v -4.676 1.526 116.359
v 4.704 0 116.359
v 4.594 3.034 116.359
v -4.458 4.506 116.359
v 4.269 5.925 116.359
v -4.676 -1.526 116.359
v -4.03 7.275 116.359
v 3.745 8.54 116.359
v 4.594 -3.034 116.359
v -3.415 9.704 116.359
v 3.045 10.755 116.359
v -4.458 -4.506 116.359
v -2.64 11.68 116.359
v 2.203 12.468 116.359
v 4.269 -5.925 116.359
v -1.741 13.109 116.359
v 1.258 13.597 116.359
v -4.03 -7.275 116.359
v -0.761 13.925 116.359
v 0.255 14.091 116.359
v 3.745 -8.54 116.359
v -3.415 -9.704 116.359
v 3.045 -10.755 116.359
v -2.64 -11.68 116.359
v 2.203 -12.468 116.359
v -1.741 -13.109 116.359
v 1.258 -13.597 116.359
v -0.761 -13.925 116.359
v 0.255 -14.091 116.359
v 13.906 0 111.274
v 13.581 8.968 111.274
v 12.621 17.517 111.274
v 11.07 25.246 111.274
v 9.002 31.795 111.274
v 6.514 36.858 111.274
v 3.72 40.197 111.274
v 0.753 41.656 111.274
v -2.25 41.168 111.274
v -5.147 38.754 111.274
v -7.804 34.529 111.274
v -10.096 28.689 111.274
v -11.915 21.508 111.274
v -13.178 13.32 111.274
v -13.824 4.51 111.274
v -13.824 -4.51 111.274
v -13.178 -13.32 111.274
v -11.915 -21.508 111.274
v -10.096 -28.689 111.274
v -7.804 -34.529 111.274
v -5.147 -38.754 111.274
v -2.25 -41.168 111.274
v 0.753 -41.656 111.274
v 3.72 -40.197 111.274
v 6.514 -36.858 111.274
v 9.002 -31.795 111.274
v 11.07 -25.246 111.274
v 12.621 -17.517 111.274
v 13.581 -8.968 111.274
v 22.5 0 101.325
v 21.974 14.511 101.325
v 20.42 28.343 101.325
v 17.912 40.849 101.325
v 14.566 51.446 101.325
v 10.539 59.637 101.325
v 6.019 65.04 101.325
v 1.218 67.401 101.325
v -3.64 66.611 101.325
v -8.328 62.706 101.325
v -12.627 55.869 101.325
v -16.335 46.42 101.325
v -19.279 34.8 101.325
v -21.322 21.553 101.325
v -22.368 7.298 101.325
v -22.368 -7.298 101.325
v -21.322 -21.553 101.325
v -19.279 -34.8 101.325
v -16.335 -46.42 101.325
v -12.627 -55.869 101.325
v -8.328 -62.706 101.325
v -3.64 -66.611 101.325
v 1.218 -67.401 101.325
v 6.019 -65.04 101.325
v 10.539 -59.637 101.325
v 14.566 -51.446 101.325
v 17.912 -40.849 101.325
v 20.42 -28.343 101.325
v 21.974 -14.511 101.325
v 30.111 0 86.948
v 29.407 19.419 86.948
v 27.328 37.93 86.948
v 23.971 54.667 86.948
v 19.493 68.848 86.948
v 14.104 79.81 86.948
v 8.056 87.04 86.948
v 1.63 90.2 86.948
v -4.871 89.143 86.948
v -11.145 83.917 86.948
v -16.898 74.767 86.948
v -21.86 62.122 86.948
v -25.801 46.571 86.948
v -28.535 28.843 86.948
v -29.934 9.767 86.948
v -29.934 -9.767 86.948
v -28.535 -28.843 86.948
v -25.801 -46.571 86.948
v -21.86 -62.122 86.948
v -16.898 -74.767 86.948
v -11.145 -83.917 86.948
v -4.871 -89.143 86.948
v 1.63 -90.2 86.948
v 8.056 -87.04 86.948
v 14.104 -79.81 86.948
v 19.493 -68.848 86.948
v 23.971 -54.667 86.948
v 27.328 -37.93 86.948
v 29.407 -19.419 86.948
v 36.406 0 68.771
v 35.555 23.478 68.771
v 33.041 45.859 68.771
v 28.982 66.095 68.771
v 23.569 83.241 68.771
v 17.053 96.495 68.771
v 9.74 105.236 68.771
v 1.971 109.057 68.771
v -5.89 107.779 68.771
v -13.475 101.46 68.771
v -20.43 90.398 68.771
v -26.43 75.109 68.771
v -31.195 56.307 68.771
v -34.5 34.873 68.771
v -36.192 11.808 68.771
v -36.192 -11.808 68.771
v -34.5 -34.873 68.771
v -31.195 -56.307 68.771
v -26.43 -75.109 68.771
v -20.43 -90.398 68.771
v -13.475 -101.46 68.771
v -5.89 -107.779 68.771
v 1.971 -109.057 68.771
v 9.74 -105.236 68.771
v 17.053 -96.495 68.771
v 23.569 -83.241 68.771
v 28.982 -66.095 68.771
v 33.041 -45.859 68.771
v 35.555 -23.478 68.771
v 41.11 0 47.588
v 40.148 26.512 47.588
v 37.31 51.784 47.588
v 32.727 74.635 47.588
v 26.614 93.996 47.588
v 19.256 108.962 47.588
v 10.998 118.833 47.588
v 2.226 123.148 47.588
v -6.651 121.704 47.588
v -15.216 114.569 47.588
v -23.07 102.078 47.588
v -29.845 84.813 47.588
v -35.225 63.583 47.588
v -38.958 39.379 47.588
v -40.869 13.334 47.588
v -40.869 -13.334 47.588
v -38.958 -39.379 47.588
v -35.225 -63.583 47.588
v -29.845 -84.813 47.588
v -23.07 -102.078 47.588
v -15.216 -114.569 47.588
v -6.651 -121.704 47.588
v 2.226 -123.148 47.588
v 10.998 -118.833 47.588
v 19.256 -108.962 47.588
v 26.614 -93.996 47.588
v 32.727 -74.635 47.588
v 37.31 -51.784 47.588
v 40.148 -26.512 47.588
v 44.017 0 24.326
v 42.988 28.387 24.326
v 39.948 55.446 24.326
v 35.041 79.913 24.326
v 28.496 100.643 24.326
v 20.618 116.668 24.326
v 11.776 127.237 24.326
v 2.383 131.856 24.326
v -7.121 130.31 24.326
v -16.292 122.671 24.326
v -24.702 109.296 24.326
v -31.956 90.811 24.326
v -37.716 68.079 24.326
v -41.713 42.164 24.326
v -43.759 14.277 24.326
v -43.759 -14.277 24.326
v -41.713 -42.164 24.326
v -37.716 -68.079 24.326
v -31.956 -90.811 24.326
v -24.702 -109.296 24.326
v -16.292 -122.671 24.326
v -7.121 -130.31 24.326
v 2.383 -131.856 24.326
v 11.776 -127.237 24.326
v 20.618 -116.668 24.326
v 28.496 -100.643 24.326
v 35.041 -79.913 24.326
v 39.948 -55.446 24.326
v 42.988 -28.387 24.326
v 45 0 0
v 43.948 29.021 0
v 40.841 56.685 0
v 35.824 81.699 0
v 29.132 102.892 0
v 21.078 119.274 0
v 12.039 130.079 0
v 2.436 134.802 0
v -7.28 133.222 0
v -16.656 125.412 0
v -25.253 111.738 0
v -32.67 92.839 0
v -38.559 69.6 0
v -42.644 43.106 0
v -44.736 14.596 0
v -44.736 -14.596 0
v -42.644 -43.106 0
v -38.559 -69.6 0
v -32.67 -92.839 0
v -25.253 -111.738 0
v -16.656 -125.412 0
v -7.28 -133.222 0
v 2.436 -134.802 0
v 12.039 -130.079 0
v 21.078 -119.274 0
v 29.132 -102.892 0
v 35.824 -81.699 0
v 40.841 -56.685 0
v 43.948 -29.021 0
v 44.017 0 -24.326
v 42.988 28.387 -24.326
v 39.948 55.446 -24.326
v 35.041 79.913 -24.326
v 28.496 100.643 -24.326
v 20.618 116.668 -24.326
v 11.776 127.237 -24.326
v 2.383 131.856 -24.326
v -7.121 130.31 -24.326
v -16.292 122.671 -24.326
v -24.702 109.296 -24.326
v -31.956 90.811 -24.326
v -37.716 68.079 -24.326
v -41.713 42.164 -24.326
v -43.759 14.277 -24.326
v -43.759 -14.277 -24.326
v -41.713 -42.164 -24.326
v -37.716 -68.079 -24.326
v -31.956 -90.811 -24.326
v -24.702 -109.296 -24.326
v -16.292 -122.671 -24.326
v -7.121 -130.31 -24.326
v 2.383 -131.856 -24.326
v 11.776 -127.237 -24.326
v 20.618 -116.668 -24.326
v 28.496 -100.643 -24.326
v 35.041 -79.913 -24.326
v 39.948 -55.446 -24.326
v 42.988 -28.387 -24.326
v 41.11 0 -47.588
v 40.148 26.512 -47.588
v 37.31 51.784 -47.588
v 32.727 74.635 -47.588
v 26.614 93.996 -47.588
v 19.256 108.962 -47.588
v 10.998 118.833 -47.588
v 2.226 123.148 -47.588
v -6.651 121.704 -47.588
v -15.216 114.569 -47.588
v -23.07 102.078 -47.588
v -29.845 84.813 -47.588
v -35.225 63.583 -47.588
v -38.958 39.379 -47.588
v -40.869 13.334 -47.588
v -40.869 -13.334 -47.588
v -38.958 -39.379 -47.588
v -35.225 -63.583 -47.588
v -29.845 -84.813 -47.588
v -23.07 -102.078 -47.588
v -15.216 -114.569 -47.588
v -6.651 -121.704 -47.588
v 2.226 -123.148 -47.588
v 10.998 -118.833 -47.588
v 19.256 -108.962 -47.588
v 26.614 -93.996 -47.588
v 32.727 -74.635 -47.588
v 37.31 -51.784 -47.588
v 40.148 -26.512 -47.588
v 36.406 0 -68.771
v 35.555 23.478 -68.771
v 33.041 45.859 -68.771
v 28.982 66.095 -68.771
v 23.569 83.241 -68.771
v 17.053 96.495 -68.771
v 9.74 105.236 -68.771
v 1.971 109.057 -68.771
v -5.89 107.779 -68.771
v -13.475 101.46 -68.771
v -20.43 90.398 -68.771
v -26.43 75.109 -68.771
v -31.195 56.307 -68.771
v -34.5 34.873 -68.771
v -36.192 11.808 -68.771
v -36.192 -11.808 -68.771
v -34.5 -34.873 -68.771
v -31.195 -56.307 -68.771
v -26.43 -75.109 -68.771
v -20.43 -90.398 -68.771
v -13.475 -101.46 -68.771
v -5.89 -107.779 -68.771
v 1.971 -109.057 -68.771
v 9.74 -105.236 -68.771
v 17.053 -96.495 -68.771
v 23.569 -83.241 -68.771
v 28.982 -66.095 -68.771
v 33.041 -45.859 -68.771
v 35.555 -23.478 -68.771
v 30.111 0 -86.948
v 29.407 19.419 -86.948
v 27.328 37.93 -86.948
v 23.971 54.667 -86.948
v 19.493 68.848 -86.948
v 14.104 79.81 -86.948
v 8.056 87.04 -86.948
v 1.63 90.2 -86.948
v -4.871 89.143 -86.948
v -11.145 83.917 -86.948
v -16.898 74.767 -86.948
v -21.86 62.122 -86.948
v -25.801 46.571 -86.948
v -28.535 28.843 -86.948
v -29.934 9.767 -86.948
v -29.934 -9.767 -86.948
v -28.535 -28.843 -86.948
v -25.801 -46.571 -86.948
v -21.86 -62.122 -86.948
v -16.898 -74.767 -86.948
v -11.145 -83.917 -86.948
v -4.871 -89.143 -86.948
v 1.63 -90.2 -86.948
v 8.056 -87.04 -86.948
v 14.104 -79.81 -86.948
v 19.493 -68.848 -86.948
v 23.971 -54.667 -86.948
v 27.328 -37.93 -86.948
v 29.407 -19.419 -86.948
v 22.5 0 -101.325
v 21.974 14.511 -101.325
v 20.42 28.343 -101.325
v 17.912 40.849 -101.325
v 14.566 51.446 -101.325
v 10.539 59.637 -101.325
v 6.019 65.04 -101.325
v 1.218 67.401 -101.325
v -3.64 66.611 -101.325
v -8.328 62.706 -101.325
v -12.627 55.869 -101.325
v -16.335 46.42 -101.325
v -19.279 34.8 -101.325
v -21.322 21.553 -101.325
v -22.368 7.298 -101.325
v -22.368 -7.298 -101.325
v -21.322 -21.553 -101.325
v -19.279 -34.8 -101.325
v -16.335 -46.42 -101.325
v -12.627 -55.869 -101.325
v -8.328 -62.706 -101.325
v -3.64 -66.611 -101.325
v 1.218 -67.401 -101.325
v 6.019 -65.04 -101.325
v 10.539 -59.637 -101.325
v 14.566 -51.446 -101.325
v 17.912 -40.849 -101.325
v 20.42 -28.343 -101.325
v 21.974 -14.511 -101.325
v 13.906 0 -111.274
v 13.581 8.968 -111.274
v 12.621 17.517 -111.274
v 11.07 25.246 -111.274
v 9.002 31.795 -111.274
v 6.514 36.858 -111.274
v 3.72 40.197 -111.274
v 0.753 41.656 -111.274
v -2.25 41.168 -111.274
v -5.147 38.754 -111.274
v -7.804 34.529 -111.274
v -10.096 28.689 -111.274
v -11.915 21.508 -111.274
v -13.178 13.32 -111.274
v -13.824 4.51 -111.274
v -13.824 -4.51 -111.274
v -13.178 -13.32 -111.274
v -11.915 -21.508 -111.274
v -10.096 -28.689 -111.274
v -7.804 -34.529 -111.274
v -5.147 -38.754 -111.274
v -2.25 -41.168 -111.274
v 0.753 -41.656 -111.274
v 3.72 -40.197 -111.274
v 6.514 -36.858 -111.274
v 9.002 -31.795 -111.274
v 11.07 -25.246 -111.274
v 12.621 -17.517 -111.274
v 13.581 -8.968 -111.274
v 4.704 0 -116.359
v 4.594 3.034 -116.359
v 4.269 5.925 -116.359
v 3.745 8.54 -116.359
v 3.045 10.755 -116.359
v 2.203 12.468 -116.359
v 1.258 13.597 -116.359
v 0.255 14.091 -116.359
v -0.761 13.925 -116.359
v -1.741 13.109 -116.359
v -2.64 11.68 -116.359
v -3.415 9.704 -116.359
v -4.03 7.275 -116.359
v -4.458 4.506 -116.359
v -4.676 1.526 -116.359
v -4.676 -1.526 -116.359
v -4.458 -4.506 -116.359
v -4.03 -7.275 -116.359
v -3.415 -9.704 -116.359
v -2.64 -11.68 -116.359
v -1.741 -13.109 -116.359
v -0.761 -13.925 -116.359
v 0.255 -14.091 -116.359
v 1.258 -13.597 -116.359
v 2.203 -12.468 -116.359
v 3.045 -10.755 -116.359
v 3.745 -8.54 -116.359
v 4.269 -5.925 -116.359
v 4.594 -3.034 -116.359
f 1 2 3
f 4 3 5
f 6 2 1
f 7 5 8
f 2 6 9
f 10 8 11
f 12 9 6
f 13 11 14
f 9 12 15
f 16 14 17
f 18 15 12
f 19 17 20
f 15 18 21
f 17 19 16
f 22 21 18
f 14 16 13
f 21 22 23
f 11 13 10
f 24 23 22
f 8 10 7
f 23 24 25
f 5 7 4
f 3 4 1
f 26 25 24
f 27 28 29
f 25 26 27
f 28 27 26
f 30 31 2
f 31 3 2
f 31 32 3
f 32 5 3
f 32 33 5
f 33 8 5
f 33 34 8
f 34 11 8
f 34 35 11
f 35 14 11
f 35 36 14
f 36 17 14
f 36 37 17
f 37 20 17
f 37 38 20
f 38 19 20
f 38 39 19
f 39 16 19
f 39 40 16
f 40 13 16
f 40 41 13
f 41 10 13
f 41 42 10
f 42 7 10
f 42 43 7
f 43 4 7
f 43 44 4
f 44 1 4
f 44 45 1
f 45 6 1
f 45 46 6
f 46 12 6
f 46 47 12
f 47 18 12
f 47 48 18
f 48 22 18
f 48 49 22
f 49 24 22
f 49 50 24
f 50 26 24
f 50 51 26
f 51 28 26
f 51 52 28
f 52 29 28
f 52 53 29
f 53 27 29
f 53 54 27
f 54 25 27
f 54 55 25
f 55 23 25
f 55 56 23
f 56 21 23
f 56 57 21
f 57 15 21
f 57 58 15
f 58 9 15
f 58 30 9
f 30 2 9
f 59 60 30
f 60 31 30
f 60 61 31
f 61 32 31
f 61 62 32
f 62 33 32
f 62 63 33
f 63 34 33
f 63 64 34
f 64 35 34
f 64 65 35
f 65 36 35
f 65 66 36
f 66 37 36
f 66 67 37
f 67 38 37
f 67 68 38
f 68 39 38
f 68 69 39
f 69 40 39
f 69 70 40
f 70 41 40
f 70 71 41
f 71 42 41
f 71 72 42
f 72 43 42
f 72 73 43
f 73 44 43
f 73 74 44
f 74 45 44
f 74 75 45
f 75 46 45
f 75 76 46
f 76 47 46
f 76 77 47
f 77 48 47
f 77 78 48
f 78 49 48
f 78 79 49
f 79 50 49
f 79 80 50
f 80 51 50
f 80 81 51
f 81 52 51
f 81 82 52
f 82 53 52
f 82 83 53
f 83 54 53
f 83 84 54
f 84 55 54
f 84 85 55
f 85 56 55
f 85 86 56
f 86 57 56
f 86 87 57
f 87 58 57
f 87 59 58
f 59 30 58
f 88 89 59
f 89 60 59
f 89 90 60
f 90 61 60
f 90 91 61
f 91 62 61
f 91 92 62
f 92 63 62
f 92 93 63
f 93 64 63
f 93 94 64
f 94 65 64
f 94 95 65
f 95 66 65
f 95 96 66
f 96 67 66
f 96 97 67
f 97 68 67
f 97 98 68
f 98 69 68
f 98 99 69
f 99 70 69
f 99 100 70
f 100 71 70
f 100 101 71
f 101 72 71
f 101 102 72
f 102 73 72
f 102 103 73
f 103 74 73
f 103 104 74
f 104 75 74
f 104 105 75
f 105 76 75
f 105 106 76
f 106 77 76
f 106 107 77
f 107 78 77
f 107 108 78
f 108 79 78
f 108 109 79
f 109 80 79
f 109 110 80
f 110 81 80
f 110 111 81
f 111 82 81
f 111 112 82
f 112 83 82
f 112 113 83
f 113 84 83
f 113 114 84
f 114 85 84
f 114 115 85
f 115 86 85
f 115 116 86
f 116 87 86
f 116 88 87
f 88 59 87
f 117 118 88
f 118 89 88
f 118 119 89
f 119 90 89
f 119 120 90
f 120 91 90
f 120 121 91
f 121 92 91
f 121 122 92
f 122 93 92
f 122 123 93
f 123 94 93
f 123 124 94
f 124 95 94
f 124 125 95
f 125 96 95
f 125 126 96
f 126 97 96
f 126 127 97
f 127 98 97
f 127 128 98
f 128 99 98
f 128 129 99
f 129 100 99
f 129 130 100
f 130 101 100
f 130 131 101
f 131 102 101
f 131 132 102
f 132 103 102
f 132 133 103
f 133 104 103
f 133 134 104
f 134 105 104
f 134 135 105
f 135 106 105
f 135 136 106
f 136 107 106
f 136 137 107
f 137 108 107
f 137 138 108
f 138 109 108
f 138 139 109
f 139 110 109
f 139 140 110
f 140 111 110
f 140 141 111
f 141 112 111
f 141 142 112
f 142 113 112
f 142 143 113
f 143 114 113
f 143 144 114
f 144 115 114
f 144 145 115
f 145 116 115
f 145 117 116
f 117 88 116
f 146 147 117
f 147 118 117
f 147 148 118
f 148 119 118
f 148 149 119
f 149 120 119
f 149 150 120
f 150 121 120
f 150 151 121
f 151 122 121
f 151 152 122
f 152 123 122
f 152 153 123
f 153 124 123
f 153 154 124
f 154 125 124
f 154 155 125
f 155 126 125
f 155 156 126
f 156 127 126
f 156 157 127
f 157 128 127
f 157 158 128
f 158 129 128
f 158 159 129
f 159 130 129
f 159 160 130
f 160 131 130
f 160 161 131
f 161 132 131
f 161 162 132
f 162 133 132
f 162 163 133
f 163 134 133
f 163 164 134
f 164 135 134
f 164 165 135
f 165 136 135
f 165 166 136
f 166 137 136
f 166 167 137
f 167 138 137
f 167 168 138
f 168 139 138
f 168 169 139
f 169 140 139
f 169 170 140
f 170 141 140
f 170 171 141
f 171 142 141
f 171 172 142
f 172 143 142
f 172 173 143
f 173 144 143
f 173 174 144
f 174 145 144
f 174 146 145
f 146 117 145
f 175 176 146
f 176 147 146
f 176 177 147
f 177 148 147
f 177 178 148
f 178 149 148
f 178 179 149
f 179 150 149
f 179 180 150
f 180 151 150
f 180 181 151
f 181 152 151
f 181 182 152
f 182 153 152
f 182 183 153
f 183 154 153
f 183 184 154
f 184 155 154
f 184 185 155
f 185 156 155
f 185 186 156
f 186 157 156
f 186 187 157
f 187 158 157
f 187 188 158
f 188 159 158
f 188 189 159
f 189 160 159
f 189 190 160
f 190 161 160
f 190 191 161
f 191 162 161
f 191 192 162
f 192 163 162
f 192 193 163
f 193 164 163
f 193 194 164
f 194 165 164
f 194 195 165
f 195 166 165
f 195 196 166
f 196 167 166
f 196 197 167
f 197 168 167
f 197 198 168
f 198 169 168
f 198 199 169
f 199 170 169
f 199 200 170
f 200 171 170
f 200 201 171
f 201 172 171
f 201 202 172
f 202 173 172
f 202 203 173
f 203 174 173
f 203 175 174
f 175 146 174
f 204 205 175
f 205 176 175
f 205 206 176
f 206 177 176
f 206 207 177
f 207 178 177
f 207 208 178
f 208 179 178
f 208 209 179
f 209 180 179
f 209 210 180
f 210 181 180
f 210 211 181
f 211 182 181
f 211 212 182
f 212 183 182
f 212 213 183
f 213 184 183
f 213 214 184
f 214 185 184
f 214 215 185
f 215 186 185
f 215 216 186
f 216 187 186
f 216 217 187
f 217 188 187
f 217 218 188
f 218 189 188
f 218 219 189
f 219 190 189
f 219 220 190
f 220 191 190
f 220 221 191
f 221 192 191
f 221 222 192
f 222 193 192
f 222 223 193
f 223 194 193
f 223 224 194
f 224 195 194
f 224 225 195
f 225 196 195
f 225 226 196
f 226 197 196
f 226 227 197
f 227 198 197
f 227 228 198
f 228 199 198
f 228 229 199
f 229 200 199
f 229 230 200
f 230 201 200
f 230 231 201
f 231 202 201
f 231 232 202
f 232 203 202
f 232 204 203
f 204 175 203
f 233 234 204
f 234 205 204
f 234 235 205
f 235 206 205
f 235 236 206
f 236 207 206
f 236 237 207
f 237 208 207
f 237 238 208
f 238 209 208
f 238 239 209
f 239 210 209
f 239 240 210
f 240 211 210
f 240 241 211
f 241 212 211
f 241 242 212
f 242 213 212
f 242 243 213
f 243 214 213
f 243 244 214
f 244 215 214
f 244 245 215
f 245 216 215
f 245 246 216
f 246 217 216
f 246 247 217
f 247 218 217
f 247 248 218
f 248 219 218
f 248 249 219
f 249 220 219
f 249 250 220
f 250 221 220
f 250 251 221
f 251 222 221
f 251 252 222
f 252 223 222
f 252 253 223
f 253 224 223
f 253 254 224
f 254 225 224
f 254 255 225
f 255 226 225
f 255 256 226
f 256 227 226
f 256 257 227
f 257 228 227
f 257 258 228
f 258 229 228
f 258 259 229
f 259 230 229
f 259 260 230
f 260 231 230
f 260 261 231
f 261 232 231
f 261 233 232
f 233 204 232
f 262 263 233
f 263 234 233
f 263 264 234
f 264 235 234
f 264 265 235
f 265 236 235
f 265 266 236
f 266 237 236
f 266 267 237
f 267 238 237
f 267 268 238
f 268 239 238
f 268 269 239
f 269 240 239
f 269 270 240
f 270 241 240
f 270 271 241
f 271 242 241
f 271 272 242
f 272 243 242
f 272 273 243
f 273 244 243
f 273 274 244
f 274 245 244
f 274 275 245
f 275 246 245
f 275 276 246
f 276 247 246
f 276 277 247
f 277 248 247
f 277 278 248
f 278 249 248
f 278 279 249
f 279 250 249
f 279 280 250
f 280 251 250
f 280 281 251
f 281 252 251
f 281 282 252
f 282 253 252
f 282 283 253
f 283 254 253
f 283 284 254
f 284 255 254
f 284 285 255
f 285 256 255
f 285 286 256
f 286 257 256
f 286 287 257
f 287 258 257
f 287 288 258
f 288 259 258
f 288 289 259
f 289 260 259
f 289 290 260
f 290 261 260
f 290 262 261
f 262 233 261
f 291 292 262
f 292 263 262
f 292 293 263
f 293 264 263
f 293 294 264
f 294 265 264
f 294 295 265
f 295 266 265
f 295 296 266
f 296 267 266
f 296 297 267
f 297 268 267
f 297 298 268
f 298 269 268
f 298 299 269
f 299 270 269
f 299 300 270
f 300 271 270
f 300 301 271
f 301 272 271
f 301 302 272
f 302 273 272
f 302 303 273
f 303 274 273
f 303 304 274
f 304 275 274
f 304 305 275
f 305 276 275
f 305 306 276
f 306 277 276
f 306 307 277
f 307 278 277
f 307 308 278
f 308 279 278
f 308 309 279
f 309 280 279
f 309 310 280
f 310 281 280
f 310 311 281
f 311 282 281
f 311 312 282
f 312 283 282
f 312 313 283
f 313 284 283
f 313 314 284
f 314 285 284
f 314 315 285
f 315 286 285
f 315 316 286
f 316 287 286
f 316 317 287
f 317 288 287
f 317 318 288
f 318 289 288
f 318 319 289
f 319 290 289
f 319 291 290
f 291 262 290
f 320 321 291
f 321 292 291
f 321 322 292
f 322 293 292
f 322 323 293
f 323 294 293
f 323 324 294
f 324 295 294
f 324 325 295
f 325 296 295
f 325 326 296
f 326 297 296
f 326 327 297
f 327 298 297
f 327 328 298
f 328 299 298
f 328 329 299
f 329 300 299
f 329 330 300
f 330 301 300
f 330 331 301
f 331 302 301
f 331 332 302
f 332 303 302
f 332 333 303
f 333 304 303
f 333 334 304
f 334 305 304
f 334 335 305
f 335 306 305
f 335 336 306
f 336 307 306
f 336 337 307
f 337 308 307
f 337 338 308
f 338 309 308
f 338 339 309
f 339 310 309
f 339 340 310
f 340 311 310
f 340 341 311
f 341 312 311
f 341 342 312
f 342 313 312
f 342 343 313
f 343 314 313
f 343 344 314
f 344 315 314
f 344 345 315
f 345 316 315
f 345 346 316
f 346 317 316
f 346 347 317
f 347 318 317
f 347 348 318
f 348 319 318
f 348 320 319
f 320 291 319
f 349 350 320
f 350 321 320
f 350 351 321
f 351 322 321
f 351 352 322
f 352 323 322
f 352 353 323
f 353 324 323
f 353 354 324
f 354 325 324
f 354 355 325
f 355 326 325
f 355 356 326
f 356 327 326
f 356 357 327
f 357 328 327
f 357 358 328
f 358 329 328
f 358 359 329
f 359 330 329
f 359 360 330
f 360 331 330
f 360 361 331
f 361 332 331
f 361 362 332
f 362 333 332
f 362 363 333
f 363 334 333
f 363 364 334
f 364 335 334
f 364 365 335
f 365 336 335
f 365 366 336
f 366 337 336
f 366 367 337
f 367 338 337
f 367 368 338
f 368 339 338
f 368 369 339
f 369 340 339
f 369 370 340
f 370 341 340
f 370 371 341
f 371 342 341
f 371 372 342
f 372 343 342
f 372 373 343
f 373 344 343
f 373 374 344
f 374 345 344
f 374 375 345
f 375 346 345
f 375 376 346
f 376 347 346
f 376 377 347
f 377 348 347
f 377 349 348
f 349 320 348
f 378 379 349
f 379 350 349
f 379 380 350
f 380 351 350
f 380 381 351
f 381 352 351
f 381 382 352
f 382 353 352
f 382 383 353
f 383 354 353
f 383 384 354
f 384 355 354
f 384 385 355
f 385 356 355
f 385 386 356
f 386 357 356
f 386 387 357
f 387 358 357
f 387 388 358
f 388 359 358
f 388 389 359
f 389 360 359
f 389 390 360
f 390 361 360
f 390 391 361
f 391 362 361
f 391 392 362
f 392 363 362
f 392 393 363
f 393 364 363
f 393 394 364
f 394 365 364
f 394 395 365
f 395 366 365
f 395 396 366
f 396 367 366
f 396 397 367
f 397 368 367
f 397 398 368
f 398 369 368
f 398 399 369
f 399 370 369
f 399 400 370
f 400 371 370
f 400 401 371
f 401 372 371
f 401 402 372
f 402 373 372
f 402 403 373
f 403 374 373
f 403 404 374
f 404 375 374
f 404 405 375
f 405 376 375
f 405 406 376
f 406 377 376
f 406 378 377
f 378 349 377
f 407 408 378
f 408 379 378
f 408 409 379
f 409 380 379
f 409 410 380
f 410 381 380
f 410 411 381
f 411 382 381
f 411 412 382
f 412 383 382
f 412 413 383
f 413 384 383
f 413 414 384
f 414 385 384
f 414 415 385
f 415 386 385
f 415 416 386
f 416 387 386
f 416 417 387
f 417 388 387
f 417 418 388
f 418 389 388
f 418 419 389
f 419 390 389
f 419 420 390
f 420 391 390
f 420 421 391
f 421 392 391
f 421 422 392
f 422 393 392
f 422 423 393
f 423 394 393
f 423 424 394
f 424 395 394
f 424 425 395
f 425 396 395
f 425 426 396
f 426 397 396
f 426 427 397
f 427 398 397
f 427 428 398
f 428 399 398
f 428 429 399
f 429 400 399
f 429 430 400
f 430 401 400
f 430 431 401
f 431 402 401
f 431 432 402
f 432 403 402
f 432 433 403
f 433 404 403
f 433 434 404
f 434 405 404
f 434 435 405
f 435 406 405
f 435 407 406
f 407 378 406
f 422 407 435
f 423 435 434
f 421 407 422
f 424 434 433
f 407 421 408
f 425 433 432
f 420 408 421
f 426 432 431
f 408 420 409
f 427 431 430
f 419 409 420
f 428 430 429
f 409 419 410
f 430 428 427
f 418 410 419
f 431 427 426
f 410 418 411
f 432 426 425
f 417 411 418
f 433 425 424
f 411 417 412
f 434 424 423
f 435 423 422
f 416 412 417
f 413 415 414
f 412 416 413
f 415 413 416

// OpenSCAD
// Generated by SolidPython 1.0.1 on 2020-07-29 00:46:46


scale(v = [5, 15, 13]) {
	sphere(r = 9);
}
/***********************************************
*********      SolidPython code:      **********
************************************************
 
# import packages: SolidPython
from solid import *
from solid.utils import *
from itertools import chain, combinations, permutations


class Resize:

    def __init__(self, scad_file):
        self.scad_file = scad_file
        #self.scad_file = import_scad(scad_file)
        # cone/cylinder param:
        self.r1 = 0
        self.r2 = 0
        self.h = 0
        # rectangular prism param:
        self.w = 0
        self.l = 0
        # ellipse param:
        self.r = 0

    # import OpenScad code (file name corresponds to shape)


    # classify shape + parameters
    def assign(self, param1, param2, param3):
        if self.scad_file == 'cone.scad':
            self.r1 = param1
            self.r2 = param2
            self.h = param3
        elif self.scad_file == 'cylinder.scad':
            self.r1 = param1
            self.r2 = param2
            self.h = param3
        elif self.scad_file == 'rectangularPrism.scad':
            self.h = param1
            self.l = param2
            self.w = param3
        else:
            self.r = param1
            self.h = param2

    # resize parameters
    def iterate(self):
        x = range(3, 20, 2)
        i = 1
        if self.scad_file == 'cone.scad':
            tempList = list(permutations(x, 2))
            for temp in tempList:
                param1 = temp[0]
                param2 = temp[1]
                filepath = 'produced_scad_files/' + 'cone' + str(param1) + '_' + str(param2) + '_' + '.scad'
                scad_render_to_file(cylinder(h=param1, r1=param2, r2=0), filepath)

        elif self.scad_file == 'cylinder.scad':
            tempList = list(permutations(x, 3))
            for temp in tempList:
                param1 = temp[0]
                param2 = temp[1]
                filepath = 'produced_scad_files/' + 'cylinder' + str(param1) + '_' + str(param2) + '_' + '.scad'
                scad_render_to_file(cylinder(h=param1, r1=param2, r2=param2), filepath)

        elif self.scad_file == 'rectangularPrism.scad':
            tempList = list(permutations(x, 3))
            for temp in tempList:
                param1 = temp[0]
                param2 = temp[1]
                param3 = temp[2]
                filepath = 'produced_scad_files/' + 'rectangularPrism' + str(param1) + '_' + str(param2) + '_' + str(
                    param3) + '.scad'
                scad_render_to_file(cube(size=(param1, param2, param3)), filepath)

        elif self.scad_file == 'ellipse.scad':
            tempList = list(permutations(x, 4))
            for temp in tempList:
                param1 = temp[0]
                param2 = temp[1]
                param3 = temp[2]
                param4 = temp[3]
                filepath = 'produced_scad_files/' + 'ellipse' + str(param1) + '_' + str(param2) + '_' + str(param3) + '_' + str(param4) + '.scad'
                scad_render_to_file(scale([param1, param2, param3])(sphere(r=param4)), filepath)

    def render_to_scadfile(self):
        scad_render_to_file(scad, 'example.scad') 
 
************************************************/
